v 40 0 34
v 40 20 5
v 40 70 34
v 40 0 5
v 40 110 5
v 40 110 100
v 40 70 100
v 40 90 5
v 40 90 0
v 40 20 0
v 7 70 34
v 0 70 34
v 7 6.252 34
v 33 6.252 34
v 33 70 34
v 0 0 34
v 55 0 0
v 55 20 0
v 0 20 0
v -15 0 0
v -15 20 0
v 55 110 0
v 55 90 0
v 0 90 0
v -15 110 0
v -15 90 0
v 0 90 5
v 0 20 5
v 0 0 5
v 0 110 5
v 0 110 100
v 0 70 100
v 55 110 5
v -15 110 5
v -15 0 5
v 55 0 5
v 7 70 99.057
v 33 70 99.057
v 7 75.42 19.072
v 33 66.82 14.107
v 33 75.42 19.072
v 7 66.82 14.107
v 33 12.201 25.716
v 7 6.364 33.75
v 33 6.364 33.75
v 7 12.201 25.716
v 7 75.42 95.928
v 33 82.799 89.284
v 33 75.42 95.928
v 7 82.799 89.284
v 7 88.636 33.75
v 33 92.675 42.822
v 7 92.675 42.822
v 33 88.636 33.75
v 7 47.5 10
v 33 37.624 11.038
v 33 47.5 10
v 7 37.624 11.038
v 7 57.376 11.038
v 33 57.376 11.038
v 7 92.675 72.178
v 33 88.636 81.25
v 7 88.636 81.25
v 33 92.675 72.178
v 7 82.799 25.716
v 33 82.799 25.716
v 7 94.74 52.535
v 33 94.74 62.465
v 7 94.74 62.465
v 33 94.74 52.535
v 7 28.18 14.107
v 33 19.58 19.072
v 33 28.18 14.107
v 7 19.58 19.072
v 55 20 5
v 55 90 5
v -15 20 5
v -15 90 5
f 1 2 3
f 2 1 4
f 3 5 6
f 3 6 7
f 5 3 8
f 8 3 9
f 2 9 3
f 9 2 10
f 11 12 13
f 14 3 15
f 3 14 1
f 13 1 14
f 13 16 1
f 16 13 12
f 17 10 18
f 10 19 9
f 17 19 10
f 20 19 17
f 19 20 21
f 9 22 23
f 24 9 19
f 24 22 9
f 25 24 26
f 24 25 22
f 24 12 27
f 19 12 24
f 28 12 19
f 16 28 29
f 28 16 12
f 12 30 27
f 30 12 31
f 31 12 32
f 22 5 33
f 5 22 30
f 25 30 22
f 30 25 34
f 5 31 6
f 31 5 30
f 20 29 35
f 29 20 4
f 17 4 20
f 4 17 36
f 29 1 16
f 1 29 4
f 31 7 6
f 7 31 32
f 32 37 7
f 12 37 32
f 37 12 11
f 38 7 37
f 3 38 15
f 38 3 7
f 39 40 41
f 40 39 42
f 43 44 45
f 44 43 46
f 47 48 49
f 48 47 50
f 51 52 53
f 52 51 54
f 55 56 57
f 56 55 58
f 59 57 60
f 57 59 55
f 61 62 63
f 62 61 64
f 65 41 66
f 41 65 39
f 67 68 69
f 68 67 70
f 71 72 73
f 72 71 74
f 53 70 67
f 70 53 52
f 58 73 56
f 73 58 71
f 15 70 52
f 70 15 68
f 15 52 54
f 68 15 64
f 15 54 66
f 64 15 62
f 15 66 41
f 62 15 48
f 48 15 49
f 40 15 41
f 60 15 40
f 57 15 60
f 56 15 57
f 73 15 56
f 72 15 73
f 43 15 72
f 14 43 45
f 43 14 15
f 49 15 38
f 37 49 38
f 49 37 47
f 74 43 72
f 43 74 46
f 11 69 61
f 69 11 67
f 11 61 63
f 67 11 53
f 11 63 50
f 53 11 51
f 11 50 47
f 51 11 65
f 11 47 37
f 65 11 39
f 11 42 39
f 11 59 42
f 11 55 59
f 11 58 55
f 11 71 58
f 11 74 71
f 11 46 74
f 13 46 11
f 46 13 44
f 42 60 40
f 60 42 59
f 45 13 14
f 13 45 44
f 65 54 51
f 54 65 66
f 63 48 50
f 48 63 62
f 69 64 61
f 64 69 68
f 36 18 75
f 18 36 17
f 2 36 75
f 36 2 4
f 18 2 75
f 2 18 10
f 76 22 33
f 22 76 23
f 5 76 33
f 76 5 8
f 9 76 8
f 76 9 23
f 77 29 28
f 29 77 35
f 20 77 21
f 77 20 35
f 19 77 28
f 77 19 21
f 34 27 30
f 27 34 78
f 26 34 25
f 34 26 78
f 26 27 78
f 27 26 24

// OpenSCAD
// Chock Body
back_offset_y=70;
module body () {
    union(){
        //bottom
        cube([40, 110, 34]);
        //back
        translate ([0, back_offset_y, 0]){
            cube([40, 40, 100]);
        }
    }
}

wheeld = 95;

// cutout wheel 
difference(){
    body();
    translate([7, wheeld/2, wheeld/2+10]){
        rotate(a=90, v=[0,1,0]){
            cylinder(h=26, d1=wheeld, d2=wheeld);
        }
    }
}

wing_x=15;
wing_y=20;
wing_z=5;
// Add wings (right)
translate([40, 0]){
    cube([wing_x, wing_y, wing_z]);
}
translate([40, back_offset_y+wing_y, 0]){
    cube([wing_x, wing_y, wing_z]);
}

// Add wings (left)
translate([-wing_x, 0]){
    cube([wing_x, wing_y, wing_z]);
}
translate([-wing_x, back_offset_y+wing_y]){
    cube([wing_x, wing_y, wing_z]);
}
